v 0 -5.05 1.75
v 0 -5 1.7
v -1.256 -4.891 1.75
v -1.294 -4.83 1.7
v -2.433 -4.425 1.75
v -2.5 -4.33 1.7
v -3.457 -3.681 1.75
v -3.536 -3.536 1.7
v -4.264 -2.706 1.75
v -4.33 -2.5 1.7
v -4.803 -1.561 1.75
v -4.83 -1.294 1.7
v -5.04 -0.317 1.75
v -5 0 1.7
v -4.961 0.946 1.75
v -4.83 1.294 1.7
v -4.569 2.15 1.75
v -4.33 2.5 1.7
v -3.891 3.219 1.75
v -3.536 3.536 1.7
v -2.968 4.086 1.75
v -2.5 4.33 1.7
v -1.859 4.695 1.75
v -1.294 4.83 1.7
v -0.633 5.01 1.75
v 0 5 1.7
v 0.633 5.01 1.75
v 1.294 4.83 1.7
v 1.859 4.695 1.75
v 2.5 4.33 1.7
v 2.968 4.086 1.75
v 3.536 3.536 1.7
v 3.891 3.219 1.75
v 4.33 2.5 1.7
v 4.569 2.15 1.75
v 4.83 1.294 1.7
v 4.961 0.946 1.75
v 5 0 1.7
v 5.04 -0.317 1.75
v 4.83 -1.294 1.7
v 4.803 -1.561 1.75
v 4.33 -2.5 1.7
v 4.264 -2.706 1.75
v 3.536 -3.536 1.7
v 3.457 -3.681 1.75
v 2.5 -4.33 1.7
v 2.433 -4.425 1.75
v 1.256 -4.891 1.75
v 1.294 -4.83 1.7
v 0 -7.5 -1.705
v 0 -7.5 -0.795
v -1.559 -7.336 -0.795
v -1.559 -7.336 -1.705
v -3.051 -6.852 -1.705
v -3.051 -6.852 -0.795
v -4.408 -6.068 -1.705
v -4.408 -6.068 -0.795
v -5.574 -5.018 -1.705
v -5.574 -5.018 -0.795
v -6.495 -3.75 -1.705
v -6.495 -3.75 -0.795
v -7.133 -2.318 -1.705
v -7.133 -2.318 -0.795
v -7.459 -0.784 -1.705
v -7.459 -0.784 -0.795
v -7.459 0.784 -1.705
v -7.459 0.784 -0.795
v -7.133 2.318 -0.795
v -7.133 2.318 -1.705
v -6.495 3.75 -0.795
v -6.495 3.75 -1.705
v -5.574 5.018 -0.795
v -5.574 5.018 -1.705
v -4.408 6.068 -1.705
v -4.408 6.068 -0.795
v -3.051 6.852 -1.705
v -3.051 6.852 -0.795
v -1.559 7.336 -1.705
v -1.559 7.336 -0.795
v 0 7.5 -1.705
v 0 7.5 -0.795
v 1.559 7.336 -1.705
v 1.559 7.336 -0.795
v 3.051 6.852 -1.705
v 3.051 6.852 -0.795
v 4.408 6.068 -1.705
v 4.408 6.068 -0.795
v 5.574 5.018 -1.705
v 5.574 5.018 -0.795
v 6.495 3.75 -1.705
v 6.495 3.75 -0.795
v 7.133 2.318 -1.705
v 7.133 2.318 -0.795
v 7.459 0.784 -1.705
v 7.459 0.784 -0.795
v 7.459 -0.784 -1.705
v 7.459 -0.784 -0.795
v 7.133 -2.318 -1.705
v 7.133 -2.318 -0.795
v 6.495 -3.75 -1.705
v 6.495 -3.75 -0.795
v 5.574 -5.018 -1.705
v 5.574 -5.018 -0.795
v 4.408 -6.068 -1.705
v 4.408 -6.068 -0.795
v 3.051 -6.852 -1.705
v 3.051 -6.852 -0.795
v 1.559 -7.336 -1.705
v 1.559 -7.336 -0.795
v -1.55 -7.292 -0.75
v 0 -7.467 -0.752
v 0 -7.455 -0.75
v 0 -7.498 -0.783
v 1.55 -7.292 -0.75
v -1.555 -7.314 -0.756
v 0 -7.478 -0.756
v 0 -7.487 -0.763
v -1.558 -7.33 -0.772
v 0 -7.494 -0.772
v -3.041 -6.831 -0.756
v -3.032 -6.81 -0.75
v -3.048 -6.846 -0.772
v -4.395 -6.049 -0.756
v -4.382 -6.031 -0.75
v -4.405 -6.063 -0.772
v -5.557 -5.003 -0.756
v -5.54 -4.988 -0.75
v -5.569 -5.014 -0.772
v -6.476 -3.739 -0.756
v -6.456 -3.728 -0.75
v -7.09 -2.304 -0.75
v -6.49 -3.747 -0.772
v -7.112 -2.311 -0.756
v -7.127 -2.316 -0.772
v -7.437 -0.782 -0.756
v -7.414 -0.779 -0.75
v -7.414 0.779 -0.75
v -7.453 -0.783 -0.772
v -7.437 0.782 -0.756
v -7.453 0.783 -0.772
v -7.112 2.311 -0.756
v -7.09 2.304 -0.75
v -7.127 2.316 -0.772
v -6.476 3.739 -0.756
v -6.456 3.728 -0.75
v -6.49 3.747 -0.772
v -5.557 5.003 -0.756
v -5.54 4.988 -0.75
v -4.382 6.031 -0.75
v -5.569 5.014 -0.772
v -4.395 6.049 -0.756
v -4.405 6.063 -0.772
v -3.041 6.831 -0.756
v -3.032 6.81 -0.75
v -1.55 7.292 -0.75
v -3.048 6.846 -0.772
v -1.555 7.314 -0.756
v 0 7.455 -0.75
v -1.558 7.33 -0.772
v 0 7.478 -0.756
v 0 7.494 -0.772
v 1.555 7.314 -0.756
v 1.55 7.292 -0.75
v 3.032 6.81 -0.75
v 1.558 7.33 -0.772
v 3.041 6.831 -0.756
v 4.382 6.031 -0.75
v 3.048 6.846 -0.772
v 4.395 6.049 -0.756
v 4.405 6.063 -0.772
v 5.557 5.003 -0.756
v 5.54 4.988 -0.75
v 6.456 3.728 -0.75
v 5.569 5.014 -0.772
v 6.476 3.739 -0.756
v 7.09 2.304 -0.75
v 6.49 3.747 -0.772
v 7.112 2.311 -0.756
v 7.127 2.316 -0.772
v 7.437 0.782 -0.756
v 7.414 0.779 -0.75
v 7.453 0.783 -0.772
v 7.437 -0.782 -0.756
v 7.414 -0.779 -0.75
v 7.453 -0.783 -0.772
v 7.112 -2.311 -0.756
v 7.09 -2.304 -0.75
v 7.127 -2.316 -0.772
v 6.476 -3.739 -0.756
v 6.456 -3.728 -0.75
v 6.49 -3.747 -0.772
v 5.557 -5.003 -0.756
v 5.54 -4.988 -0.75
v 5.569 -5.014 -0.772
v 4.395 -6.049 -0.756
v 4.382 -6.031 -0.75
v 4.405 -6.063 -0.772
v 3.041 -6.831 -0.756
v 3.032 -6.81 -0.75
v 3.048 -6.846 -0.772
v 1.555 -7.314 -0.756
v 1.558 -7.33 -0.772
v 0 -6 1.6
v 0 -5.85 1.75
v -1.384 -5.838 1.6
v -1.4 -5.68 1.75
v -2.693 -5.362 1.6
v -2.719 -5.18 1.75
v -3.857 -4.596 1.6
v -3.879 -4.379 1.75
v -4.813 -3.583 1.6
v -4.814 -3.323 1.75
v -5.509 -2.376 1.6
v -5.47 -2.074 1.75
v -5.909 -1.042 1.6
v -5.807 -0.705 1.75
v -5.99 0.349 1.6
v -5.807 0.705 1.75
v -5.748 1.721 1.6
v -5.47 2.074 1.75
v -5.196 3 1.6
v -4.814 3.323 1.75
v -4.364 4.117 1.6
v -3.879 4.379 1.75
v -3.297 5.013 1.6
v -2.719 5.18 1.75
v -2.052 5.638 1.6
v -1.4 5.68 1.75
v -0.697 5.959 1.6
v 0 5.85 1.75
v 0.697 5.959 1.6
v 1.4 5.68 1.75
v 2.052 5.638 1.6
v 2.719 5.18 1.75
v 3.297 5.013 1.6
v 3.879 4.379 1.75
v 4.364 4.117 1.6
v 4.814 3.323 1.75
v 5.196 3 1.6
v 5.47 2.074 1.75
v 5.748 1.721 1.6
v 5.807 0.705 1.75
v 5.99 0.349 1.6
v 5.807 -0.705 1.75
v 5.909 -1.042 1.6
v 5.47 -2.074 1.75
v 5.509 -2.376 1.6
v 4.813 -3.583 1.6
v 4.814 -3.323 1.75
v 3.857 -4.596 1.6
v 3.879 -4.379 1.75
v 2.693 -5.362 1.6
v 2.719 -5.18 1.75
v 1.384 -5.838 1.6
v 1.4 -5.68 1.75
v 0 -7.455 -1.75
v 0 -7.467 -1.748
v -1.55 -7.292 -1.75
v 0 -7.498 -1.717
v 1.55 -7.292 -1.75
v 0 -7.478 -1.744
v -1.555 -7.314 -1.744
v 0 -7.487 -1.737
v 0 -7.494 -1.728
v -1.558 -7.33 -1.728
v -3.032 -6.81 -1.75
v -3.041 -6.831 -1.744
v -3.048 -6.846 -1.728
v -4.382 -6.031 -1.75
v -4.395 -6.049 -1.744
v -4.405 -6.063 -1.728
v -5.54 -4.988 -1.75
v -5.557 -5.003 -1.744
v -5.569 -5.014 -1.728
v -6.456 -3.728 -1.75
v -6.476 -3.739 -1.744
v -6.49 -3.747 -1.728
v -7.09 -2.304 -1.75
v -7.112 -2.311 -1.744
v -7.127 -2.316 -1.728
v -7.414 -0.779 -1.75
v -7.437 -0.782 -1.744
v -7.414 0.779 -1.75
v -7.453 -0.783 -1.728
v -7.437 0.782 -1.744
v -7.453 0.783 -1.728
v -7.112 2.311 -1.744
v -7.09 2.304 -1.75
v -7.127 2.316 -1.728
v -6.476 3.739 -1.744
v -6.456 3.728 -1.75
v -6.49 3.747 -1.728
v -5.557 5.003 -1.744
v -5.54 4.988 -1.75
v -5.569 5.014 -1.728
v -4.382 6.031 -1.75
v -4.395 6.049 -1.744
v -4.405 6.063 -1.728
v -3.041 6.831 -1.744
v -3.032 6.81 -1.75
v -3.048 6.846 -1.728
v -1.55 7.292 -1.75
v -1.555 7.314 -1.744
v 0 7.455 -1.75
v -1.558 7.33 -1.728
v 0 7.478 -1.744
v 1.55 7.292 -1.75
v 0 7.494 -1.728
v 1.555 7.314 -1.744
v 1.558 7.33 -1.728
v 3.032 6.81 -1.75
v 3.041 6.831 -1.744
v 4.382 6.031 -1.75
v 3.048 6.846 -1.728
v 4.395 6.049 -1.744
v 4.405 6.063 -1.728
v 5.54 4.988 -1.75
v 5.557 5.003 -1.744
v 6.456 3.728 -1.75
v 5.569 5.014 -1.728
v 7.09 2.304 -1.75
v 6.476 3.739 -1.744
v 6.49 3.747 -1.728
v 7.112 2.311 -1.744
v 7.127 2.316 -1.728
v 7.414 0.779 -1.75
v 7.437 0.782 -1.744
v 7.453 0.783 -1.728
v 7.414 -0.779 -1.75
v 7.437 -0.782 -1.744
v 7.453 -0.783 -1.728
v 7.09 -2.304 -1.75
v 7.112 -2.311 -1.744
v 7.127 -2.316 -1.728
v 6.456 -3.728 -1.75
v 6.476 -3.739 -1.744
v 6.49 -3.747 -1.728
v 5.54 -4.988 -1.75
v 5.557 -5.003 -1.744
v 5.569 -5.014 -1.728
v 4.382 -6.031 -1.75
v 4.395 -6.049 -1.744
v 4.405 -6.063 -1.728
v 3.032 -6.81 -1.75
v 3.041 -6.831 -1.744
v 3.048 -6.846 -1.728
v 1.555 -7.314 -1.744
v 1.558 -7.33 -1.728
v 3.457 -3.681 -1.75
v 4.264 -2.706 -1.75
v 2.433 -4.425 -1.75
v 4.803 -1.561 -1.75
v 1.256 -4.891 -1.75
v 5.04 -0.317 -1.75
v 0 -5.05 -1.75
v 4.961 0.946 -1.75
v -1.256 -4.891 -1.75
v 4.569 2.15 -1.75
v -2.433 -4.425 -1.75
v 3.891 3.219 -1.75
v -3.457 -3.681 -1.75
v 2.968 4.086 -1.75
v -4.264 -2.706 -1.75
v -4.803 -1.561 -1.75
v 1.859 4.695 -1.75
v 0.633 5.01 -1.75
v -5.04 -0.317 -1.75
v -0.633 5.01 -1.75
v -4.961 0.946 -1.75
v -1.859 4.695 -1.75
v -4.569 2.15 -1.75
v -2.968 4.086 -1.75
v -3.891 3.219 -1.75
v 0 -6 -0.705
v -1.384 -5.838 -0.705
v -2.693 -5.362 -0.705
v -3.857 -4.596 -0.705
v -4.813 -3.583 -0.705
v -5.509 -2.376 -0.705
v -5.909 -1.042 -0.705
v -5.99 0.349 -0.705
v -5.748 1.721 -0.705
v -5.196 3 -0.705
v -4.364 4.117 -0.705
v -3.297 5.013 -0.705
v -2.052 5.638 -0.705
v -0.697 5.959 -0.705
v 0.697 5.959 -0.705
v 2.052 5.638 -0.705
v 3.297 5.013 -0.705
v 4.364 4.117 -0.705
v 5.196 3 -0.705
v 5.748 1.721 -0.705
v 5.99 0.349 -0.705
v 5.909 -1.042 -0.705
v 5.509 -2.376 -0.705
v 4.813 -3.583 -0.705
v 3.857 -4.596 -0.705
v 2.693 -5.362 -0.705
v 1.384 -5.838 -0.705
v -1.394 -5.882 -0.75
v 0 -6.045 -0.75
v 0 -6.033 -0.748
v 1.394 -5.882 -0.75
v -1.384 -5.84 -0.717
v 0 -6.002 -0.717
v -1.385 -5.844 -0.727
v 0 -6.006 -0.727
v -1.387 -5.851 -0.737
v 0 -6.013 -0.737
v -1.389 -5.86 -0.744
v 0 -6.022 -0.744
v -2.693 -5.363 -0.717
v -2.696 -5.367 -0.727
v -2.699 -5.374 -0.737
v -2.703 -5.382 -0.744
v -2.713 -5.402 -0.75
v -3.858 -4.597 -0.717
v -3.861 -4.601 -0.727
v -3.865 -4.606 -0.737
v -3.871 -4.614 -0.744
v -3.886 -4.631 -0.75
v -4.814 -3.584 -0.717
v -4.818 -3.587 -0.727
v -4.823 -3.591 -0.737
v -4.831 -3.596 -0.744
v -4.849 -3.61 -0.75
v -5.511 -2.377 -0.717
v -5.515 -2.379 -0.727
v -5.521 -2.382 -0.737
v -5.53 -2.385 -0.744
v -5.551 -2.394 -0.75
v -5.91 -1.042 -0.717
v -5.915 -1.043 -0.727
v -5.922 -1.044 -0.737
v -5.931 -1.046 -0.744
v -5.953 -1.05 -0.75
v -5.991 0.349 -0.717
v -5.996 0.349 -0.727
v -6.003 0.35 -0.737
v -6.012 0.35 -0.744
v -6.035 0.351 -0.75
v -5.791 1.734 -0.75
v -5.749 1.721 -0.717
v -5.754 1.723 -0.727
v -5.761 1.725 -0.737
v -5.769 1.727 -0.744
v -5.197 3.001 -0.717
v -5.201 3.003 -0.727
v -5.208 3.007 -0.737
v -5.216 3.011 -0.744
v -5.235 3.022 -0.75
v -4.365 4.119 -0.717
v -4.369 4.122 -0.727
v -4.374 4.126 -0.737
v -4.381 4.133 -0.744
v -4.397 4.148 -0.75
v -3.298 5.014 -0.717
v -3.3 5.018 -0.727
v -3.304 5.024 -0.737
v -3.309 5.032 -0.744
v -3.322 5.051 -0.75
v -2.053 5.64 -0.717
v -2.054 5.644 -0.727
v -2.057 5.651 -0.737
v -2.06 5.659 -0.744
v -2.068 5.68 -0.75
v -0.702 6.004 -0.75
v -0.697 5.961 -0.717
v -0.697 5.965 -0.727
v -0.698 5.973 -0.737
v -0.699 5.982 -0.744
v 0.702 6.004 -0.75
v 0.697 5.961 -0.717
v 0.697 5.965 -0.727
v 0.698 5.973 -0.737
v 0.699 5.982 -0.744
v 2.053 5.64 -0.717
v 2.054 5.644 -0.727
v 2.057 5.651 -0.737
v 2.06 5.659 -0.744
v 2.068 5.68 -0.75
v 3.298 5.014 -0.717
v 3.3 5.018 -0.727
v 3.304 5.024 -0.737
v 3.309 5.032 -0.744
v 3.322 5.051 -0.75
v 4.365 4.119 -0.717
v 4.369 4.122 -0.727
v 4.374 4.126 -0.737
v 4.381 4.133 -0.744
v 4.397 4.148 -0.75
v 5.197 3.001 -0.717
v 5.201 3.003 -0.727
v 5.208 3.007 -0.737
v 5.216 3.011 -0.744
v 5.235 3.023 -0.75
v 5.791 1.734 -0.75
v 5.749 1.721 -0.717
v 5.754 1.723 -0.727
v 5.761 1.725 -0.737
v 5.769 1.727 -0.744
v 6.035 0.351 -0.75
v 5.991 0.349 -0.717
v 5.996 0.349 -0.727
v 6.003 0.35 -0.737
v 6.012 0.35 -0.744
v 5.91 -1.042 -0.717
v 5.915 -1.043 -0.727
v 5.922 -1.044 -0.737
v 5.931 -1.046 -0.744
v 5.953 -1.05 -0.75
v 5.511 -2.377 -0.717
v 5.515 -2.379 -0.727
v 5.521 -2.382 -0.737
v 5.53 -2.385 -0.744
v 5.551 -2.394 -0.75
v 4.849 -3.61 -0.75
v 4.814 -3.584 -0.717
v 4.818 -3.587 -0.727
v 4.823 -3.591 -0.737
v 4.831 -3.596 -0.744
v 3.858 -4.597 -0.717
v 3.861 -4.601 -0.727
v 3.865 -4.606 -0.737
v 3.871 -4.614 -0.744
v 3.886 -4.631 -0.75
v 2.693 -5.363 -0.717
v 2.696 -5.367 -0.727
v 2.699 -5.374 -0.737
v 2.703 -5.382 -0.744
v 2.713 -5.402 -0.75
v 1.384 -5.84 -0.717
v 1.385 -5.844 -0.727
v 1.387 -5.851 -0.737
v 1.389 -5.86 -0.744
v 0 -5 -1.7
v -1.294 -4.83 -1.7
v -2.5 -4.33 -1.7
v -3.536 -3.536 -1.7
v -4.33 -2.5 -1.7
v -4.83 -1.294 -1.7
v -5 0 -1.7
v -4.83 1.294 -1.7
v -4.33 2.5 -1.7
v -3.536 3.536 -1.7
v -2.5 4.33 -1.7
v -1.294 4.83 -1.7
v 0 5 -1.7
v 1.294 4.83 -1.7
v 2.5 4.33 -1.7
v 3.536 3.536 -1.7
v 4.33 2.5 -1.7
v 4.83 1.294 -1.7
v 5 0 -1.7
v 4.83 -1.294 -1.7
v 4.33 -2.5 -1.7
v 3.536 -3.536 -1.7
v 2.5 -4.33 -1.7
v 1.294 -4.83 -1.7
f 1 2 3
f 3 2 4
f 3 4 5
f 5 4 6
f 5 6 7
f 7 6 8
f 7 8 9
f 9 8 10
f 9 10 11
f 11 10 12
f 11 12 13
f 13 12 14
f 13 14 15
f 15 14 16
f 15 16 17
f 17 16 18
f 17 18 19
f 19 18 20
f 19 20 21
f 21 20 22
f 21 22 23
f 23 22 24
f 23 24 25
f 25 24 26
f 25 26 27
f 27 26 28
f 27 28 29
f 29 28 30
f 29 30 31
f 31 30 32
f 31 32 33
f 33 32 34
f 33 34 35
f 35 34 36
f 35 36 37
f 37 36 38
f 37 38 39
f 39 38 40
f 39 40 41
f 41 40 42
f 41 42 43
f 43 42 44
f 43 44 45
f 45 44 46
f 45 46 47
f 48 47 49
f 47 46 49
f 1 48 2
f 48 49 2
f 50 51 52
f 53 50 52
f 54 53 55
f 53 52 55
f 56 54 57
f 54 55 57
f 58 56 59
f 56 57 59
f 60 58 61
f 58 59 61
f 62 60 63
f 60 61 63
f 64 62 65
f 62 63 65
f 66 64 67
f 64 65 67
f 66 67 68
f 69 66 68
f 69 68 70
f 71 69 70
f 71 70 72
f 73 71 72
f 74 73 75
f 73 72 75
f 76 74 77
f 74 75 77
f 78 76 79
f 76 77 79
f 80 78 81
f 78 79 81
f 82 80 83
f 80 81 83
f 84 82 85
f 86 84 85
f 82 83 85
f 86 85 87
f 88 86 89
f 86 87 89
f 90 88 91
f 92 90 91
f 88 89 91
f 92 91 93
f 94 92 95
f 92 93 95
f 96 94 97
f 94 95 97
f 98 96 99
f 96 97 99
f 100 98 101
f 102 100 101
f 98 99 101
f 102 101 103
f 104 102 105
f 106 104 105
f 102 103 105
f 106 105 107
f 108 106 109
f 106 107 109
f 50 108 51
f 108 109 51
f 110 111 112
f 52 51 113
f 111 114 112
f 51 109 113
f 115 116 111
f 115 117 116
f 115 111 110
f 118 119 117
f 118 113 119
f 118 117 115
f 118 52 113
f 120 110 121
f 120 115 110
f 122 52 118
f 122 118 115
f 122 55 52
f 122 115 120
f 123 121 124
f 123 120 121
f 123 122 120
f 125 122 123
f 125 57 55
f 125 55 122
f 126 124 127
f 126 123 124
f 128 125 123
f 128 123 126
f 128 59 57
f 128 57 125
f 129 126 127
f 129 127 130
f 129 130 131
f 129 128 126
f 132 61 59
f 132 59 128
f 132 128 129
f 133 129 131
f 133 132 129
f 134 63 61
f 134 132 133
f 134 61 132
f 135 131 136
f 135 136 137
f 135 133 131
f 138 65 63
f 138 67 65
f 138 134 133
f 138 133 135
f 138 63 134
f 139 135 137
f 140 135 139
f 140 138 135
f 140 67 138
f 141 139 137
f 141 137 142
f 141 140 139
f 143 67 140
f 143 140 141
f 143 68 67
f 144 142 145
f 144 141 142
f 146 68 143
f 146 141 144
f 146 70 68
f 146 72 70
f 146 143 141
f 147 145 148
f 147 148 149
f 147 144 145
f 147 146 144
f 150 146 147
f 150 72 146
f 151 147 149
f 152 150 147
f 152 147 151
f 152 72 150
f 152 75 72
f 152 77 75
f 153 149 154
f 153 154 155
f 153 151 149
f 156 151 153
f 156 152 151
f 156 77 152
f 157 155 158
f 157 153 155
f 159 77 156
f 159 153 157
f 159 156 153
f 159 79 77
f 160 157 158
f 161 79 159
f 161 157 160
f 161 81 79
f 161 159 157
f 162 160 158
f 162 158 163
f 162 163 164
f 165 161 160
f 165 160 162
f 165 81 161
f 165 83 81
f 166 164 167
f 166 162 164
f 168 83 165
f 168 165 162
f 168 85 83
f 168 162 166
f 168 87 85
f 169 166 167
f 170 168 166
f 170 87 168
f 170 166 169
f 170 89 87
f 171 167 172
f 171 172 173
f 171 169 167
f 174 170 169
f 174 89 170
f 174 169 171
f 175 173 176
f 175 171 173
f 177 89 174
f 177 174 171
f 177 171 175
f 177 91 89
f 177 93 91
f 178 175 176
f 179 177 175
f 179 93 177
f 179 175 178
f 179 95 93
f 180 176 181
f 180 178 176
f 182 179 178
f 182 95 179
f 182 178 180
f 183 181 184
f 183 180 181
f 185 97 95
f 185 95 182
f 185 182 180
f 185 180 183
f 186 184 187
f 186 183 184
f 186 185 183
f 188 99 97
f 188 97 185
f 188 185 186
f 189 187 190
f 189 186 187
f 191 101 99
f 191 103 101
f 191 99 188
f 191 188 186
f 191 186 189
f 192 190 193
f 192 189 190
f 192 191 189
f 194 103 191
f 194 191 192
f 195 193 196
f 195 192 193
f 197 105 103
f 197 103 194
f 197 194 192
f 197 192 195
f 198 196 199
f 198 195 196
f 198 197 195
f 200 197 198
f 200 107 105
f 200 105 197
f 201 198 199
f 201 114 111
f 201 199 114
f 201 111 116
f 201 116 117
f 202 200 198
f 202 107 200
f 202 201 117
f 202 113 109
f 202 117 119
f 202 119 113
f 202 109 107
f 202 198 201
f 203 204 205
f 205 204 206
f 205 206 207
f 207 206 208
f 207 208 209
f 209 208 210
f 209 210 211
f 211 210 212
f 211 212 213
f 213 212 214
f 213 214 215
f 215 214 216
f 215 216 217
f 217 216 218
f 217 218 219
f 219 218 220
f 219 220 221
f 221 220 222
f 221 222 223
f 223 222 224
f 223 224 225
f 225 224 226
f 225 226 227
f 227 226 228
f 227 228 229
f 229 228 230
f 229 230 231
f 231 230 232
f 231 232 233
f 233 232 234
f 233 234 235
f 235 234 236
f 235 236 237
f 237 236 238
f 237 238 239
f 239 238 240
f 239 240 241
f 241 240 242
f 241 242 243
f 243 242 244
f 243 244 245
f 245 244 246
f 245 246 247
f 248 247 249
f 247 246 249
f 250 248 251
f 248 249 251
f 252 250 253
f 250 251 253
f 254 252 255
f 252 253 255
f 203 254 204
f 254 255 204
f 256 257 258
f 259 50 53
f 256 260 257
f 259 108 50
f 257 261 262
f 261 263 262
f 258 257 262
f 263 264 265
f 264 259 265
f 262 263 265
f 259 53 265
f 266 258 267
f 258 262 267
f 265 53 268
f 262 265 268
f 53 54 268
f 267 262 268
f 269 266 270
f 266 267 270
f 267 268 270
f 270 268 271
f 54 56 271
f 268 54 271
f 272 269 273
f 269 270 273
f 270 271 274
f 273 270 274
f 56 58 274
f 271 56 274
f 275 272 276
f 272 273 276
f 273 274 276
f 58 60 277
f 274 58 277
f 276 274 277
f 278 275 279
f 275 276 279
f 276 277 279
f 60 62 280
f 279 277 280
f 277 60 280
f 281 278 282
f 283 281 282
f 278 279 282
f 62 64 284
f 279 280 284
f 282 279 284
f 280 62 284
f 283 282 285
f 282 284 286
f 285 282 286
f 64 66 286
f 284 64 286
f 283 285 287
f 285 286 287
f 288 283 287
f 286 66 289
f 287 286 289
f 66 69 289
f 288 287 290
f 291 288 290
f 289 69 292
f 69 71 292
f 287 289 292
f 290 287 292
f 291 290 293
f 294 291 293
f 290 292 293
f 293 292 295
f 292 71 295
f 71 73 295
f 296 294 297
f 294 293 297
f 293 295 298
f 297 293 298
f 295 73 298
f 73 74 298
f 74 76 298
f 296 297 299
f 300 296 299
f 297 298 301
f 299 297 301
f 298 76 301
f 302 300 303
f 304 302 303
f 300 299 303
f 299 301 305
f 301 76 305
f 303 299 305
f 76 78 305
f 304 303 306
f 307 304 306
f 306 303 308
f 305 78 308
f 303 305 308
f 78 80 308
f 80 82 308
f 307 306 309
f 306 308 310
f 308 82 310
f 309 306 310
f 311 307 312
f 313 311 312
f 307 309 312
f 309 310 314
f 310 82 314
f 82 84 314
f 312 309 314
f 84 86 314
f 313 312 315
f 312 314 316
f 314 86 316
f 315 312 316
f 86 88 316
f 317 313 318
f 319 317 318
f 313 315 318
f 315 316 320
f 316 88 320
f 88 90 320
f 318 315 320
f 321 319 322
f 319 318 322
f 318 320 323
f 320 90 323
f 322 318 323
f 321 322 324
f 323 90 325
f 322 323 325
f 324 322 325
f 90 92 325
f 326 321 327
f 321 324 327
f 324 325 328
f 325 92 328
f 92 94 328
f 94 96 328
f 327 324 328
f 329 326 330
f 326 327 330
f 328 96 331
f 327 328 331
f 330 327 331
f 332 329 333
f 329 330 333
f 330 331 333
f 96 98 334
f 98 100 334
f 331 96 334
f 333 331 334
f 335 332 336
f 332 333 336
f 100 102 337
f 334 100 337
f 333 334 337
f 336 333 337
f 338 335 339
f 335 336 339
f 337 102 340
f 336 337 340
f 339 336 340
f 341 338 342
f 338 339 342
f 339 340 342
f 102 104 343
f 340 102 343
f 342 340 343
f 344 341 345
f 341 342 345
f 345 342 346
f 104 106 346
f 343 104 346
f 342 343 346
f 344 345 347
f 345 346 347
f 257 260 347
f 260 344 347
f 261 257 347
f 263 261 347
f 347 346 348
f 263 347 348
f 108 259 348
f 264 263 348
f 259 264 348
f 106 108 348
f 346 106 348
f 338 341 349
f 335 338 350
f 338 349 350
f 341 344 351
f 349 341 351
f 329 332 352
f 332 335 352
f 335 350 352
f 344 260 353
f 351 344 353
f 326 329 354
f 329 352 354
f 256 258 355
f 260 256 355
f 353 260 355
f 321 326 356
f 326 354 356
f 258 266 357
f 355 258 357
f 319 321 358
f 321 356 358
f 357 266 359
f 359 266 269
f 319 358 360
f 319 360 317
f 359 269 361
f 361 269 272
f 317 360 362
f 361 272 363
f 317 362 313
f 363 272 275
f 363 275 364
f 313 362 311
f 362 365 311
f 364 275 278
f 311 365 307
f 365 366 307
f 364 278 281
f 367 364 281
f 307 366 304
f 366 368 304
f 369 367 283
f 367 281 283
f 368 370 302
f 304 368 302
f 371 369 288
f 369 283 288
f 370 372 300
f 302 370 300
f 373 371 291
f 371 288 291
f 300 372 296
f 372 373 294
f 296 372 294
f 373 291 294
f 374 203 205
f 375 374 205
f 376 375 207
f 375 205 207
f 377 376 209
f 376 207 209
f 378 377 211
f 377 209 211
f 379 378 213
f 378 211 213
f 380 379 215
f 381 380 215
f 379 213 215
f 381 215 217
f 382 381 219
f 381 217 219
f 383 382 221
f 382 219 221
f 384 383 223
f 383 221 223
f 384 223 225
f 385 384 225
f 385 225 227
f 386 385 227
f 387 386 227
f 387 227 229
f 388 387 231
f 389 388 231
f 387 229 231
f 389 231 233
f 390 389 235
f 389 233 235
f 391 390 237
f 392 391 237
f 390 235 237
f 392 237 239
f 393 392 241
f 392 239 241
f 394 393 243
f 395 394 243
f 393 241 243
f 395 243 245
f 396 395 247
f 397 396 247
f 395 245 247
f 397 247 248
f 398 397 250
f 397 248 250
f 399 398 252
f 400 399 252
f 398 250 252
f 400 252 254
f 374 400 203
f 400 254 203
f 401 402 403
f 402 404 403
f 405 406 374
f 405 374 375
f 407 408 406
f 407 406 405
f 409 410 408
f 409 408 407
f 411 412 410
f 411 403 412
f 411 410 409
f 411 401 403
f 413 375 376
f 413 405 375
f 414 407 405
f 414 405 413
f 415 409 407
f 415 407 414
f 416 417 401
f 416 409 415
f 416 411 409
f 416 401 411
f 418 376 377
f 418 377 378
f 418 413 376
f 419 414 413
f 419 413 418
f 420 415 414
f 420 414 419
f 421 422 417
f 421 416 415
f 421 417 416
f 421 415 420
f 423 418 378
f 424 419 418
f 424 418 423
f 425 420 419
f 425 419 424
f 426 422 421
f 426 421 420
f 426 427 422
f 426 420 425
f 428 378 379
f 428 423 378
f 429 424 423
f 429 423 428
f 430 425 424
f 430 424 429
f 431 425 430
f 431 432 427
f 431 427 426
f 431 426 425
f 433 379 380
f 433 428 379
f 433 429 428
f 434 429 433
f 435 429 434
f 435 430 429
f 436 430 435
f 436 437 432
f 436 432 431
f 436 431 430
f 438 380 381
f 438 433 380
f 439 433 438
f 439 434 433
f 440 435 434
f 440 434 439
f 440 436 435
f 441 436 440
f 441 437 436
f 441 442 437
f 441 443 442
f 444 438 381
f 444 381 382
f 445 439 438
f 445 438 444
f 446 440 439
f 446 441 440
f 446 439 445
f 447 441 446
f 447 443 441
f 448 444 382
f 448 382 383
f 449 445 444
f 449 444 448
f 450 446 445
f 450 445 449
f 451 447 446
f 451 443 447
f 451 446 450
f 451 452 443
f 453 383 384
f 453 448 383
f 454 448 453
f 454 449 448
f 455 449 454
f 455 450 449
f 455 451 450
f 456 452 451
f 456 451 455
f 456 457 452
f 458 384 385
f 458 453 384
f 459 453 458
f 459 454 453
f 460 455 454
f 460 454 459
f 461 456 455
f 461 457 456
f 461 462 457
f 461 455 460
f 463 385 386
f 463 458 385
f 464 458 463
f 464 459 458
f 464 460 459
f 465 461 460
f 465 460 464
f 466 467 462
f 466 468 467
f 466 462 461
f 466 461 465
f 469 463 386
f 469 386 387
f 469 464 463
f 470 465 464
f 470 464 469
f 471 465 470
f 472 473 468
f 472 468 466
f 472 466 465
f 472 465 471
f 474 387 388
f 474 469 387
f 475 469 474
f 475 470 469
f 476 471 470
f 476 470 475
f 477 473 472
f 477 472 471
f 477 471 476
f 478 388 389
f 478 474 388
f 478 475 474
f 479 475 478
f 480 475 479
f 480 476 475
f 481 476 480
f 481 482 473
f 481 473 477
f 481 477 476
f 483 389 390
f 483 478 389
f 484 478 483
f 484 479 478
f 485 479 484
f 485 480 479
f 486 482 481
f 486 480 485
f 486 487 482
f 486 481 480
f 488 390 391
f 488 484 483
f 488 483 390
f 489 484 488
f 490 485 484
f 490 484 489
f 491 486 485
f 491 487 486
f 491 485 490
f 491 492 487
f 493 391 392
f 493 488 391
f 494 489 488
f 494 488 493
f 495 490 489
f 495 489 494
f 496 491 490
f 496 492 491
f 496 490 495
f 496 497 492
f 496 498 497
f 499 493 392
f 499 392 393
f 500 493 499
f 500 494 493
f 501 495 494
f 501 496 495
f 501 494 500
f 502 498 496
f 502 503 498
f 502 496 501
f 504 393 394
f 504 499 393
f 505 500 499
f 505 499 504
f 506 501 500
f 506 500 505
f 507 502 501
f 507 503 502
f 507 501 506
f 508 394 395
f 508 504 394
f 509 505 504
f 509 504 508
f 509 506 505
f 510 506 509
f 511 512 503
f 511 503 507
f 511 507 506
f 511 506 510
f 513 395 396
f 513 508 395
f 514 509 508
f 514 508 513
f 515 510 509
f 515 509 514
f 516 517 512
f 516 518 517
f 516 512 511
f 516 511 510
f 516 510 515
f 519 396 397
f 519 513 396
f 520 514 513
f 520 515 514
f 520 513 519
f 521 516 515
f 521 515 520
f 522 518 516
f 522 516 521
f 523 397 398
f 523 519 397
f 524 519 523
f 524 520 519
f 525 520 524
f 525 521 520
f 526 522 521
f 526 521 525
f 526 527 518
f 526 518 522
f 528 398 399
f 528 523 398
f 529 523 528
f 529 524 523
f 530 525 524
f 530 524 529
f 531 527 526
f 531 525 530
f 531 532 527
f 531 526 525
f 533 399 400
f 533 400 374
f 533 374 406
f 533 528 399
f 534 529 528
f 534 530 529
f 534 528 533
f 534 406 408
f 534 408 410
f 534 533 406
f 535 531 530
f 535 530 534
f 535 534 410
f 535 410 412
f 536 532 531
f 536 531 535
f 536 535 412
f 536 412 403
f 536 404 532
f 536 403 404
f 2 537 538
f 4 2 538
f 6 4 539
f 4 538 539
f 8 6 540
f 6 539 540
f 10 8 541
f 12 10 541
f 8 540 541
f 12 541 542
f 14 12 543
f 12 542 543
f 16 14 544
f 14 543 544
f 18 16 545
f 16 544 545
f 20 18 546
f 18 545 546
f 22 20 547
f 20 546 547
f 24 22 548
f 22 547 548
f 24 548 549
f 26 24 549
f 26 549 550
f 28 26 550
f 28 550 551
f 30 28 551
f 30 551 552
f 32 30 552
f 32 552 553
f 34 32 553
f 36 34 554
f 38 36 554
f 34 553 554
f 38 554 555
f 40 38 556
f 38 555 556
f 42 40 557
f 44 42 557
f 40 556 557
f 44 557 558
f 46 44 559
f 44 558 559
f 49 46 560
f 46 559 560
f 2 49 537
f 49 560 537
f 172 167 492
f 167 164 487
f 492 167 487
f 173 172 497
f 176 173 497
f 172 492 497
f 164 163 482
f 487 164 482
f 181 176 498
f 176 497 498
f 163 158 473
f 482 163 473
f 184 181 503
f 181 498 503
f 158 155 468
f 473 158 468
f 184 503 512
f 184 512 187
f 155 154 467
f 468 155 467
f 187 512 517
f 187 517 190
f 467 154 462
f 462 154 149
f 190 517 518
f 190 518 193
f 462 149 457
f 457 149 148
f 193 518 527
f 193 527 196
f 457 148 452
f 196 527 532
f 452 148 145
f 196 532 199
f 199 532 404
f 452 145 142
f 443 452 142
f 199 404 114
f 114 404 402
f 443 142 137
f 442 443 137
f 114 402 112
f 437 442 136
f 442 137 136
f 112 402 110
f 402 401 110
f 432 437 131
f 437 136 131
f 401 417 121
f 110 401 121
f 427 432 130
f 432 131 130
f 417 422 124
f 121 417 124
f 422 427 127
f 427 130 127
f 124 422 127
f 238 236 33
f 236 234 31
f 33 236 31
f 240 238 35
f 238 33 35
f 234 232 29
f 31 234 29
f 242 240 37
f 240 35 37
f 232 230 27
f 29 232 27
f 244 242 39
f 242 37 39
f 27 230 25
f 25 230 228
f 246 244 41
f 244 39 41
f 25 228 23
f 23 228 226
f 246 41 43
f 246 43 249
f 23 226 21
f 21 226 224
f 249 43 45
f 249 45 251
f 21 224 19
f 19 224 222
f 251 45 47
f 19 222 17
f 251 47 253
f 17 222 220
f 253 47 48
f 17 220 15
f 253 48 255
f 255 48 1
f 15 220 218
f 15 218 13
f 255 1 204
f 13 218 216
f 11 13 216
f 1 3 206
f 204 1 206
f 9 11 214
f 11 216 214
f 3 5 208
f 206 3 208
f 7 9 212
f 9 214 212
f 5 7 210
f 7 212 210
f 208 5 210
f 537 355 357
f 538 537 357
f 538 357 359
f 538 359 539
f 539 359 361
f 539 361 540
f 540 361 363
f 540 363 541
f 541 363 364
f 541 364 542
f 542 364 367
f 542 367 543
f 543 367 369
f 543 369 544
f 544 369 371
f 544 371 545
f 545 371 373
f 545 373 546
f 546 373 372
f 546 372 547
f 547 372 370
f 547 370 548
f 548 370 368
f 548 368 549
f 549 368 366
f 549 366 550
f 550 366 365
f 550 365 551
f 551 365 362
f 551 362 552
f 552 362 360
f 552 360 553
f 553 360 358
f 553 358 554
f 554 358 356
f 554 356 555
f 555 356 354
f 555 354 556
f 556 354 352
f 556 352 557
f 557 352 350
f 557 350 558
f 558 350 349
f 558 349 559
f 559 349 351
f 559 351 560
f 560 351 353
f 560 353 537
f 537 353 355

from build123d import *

# Parameters (mm, degrees)
CHAMFER1_SIZE = 0.15
CHAMFER2_SIZE = 0.05
FILLET1_R     = 0.045


with BuildPart() as part:
    # Sketch3 → Revolve1 (revolve)
    with BuildSketch(Plane(origin=(0, 0, 0), x_dir=(0, 0, -1), z_dir=(1, 0, 0))):
        Polygon((1.75, -7.5), (0.75, -7.5), (0.75, -6), (-1.75, -6), (-1.75, -5), (1.75, -5), align=None)
    revolve(axis=Axis((0, 0, 1.75), (0, 0, -1)))

    # Chamfer1
    chamfer1_edges = [part.edges().sort_by_distance(p)[0] for p in [
        (0, 6, 1.75),
    ]]
    chamfer(chamfer1_edges, length=CHAMFER1_SIZE)

    # Chamfer2
    chamfer2_edges = [part.edges().sort_by_distance(p)[0] for p in [
        (0, 5, -1.75),
        (0, 5, 1.75),
    ]]
    chamfer(chamfer2_edges, length=CHAMFER2_SIZE)

    # Fillet1
    fillet1_edges = [part.edges().sort_by_distance(p)[0] for p in [
        (0, 6, -0.75),
        (0, 7.5, -0.75),
        (0, 7.5, -1.75),
    ]]
    fillet(fillet1_edges, radius=FILLET1_R)


solid = part.part
